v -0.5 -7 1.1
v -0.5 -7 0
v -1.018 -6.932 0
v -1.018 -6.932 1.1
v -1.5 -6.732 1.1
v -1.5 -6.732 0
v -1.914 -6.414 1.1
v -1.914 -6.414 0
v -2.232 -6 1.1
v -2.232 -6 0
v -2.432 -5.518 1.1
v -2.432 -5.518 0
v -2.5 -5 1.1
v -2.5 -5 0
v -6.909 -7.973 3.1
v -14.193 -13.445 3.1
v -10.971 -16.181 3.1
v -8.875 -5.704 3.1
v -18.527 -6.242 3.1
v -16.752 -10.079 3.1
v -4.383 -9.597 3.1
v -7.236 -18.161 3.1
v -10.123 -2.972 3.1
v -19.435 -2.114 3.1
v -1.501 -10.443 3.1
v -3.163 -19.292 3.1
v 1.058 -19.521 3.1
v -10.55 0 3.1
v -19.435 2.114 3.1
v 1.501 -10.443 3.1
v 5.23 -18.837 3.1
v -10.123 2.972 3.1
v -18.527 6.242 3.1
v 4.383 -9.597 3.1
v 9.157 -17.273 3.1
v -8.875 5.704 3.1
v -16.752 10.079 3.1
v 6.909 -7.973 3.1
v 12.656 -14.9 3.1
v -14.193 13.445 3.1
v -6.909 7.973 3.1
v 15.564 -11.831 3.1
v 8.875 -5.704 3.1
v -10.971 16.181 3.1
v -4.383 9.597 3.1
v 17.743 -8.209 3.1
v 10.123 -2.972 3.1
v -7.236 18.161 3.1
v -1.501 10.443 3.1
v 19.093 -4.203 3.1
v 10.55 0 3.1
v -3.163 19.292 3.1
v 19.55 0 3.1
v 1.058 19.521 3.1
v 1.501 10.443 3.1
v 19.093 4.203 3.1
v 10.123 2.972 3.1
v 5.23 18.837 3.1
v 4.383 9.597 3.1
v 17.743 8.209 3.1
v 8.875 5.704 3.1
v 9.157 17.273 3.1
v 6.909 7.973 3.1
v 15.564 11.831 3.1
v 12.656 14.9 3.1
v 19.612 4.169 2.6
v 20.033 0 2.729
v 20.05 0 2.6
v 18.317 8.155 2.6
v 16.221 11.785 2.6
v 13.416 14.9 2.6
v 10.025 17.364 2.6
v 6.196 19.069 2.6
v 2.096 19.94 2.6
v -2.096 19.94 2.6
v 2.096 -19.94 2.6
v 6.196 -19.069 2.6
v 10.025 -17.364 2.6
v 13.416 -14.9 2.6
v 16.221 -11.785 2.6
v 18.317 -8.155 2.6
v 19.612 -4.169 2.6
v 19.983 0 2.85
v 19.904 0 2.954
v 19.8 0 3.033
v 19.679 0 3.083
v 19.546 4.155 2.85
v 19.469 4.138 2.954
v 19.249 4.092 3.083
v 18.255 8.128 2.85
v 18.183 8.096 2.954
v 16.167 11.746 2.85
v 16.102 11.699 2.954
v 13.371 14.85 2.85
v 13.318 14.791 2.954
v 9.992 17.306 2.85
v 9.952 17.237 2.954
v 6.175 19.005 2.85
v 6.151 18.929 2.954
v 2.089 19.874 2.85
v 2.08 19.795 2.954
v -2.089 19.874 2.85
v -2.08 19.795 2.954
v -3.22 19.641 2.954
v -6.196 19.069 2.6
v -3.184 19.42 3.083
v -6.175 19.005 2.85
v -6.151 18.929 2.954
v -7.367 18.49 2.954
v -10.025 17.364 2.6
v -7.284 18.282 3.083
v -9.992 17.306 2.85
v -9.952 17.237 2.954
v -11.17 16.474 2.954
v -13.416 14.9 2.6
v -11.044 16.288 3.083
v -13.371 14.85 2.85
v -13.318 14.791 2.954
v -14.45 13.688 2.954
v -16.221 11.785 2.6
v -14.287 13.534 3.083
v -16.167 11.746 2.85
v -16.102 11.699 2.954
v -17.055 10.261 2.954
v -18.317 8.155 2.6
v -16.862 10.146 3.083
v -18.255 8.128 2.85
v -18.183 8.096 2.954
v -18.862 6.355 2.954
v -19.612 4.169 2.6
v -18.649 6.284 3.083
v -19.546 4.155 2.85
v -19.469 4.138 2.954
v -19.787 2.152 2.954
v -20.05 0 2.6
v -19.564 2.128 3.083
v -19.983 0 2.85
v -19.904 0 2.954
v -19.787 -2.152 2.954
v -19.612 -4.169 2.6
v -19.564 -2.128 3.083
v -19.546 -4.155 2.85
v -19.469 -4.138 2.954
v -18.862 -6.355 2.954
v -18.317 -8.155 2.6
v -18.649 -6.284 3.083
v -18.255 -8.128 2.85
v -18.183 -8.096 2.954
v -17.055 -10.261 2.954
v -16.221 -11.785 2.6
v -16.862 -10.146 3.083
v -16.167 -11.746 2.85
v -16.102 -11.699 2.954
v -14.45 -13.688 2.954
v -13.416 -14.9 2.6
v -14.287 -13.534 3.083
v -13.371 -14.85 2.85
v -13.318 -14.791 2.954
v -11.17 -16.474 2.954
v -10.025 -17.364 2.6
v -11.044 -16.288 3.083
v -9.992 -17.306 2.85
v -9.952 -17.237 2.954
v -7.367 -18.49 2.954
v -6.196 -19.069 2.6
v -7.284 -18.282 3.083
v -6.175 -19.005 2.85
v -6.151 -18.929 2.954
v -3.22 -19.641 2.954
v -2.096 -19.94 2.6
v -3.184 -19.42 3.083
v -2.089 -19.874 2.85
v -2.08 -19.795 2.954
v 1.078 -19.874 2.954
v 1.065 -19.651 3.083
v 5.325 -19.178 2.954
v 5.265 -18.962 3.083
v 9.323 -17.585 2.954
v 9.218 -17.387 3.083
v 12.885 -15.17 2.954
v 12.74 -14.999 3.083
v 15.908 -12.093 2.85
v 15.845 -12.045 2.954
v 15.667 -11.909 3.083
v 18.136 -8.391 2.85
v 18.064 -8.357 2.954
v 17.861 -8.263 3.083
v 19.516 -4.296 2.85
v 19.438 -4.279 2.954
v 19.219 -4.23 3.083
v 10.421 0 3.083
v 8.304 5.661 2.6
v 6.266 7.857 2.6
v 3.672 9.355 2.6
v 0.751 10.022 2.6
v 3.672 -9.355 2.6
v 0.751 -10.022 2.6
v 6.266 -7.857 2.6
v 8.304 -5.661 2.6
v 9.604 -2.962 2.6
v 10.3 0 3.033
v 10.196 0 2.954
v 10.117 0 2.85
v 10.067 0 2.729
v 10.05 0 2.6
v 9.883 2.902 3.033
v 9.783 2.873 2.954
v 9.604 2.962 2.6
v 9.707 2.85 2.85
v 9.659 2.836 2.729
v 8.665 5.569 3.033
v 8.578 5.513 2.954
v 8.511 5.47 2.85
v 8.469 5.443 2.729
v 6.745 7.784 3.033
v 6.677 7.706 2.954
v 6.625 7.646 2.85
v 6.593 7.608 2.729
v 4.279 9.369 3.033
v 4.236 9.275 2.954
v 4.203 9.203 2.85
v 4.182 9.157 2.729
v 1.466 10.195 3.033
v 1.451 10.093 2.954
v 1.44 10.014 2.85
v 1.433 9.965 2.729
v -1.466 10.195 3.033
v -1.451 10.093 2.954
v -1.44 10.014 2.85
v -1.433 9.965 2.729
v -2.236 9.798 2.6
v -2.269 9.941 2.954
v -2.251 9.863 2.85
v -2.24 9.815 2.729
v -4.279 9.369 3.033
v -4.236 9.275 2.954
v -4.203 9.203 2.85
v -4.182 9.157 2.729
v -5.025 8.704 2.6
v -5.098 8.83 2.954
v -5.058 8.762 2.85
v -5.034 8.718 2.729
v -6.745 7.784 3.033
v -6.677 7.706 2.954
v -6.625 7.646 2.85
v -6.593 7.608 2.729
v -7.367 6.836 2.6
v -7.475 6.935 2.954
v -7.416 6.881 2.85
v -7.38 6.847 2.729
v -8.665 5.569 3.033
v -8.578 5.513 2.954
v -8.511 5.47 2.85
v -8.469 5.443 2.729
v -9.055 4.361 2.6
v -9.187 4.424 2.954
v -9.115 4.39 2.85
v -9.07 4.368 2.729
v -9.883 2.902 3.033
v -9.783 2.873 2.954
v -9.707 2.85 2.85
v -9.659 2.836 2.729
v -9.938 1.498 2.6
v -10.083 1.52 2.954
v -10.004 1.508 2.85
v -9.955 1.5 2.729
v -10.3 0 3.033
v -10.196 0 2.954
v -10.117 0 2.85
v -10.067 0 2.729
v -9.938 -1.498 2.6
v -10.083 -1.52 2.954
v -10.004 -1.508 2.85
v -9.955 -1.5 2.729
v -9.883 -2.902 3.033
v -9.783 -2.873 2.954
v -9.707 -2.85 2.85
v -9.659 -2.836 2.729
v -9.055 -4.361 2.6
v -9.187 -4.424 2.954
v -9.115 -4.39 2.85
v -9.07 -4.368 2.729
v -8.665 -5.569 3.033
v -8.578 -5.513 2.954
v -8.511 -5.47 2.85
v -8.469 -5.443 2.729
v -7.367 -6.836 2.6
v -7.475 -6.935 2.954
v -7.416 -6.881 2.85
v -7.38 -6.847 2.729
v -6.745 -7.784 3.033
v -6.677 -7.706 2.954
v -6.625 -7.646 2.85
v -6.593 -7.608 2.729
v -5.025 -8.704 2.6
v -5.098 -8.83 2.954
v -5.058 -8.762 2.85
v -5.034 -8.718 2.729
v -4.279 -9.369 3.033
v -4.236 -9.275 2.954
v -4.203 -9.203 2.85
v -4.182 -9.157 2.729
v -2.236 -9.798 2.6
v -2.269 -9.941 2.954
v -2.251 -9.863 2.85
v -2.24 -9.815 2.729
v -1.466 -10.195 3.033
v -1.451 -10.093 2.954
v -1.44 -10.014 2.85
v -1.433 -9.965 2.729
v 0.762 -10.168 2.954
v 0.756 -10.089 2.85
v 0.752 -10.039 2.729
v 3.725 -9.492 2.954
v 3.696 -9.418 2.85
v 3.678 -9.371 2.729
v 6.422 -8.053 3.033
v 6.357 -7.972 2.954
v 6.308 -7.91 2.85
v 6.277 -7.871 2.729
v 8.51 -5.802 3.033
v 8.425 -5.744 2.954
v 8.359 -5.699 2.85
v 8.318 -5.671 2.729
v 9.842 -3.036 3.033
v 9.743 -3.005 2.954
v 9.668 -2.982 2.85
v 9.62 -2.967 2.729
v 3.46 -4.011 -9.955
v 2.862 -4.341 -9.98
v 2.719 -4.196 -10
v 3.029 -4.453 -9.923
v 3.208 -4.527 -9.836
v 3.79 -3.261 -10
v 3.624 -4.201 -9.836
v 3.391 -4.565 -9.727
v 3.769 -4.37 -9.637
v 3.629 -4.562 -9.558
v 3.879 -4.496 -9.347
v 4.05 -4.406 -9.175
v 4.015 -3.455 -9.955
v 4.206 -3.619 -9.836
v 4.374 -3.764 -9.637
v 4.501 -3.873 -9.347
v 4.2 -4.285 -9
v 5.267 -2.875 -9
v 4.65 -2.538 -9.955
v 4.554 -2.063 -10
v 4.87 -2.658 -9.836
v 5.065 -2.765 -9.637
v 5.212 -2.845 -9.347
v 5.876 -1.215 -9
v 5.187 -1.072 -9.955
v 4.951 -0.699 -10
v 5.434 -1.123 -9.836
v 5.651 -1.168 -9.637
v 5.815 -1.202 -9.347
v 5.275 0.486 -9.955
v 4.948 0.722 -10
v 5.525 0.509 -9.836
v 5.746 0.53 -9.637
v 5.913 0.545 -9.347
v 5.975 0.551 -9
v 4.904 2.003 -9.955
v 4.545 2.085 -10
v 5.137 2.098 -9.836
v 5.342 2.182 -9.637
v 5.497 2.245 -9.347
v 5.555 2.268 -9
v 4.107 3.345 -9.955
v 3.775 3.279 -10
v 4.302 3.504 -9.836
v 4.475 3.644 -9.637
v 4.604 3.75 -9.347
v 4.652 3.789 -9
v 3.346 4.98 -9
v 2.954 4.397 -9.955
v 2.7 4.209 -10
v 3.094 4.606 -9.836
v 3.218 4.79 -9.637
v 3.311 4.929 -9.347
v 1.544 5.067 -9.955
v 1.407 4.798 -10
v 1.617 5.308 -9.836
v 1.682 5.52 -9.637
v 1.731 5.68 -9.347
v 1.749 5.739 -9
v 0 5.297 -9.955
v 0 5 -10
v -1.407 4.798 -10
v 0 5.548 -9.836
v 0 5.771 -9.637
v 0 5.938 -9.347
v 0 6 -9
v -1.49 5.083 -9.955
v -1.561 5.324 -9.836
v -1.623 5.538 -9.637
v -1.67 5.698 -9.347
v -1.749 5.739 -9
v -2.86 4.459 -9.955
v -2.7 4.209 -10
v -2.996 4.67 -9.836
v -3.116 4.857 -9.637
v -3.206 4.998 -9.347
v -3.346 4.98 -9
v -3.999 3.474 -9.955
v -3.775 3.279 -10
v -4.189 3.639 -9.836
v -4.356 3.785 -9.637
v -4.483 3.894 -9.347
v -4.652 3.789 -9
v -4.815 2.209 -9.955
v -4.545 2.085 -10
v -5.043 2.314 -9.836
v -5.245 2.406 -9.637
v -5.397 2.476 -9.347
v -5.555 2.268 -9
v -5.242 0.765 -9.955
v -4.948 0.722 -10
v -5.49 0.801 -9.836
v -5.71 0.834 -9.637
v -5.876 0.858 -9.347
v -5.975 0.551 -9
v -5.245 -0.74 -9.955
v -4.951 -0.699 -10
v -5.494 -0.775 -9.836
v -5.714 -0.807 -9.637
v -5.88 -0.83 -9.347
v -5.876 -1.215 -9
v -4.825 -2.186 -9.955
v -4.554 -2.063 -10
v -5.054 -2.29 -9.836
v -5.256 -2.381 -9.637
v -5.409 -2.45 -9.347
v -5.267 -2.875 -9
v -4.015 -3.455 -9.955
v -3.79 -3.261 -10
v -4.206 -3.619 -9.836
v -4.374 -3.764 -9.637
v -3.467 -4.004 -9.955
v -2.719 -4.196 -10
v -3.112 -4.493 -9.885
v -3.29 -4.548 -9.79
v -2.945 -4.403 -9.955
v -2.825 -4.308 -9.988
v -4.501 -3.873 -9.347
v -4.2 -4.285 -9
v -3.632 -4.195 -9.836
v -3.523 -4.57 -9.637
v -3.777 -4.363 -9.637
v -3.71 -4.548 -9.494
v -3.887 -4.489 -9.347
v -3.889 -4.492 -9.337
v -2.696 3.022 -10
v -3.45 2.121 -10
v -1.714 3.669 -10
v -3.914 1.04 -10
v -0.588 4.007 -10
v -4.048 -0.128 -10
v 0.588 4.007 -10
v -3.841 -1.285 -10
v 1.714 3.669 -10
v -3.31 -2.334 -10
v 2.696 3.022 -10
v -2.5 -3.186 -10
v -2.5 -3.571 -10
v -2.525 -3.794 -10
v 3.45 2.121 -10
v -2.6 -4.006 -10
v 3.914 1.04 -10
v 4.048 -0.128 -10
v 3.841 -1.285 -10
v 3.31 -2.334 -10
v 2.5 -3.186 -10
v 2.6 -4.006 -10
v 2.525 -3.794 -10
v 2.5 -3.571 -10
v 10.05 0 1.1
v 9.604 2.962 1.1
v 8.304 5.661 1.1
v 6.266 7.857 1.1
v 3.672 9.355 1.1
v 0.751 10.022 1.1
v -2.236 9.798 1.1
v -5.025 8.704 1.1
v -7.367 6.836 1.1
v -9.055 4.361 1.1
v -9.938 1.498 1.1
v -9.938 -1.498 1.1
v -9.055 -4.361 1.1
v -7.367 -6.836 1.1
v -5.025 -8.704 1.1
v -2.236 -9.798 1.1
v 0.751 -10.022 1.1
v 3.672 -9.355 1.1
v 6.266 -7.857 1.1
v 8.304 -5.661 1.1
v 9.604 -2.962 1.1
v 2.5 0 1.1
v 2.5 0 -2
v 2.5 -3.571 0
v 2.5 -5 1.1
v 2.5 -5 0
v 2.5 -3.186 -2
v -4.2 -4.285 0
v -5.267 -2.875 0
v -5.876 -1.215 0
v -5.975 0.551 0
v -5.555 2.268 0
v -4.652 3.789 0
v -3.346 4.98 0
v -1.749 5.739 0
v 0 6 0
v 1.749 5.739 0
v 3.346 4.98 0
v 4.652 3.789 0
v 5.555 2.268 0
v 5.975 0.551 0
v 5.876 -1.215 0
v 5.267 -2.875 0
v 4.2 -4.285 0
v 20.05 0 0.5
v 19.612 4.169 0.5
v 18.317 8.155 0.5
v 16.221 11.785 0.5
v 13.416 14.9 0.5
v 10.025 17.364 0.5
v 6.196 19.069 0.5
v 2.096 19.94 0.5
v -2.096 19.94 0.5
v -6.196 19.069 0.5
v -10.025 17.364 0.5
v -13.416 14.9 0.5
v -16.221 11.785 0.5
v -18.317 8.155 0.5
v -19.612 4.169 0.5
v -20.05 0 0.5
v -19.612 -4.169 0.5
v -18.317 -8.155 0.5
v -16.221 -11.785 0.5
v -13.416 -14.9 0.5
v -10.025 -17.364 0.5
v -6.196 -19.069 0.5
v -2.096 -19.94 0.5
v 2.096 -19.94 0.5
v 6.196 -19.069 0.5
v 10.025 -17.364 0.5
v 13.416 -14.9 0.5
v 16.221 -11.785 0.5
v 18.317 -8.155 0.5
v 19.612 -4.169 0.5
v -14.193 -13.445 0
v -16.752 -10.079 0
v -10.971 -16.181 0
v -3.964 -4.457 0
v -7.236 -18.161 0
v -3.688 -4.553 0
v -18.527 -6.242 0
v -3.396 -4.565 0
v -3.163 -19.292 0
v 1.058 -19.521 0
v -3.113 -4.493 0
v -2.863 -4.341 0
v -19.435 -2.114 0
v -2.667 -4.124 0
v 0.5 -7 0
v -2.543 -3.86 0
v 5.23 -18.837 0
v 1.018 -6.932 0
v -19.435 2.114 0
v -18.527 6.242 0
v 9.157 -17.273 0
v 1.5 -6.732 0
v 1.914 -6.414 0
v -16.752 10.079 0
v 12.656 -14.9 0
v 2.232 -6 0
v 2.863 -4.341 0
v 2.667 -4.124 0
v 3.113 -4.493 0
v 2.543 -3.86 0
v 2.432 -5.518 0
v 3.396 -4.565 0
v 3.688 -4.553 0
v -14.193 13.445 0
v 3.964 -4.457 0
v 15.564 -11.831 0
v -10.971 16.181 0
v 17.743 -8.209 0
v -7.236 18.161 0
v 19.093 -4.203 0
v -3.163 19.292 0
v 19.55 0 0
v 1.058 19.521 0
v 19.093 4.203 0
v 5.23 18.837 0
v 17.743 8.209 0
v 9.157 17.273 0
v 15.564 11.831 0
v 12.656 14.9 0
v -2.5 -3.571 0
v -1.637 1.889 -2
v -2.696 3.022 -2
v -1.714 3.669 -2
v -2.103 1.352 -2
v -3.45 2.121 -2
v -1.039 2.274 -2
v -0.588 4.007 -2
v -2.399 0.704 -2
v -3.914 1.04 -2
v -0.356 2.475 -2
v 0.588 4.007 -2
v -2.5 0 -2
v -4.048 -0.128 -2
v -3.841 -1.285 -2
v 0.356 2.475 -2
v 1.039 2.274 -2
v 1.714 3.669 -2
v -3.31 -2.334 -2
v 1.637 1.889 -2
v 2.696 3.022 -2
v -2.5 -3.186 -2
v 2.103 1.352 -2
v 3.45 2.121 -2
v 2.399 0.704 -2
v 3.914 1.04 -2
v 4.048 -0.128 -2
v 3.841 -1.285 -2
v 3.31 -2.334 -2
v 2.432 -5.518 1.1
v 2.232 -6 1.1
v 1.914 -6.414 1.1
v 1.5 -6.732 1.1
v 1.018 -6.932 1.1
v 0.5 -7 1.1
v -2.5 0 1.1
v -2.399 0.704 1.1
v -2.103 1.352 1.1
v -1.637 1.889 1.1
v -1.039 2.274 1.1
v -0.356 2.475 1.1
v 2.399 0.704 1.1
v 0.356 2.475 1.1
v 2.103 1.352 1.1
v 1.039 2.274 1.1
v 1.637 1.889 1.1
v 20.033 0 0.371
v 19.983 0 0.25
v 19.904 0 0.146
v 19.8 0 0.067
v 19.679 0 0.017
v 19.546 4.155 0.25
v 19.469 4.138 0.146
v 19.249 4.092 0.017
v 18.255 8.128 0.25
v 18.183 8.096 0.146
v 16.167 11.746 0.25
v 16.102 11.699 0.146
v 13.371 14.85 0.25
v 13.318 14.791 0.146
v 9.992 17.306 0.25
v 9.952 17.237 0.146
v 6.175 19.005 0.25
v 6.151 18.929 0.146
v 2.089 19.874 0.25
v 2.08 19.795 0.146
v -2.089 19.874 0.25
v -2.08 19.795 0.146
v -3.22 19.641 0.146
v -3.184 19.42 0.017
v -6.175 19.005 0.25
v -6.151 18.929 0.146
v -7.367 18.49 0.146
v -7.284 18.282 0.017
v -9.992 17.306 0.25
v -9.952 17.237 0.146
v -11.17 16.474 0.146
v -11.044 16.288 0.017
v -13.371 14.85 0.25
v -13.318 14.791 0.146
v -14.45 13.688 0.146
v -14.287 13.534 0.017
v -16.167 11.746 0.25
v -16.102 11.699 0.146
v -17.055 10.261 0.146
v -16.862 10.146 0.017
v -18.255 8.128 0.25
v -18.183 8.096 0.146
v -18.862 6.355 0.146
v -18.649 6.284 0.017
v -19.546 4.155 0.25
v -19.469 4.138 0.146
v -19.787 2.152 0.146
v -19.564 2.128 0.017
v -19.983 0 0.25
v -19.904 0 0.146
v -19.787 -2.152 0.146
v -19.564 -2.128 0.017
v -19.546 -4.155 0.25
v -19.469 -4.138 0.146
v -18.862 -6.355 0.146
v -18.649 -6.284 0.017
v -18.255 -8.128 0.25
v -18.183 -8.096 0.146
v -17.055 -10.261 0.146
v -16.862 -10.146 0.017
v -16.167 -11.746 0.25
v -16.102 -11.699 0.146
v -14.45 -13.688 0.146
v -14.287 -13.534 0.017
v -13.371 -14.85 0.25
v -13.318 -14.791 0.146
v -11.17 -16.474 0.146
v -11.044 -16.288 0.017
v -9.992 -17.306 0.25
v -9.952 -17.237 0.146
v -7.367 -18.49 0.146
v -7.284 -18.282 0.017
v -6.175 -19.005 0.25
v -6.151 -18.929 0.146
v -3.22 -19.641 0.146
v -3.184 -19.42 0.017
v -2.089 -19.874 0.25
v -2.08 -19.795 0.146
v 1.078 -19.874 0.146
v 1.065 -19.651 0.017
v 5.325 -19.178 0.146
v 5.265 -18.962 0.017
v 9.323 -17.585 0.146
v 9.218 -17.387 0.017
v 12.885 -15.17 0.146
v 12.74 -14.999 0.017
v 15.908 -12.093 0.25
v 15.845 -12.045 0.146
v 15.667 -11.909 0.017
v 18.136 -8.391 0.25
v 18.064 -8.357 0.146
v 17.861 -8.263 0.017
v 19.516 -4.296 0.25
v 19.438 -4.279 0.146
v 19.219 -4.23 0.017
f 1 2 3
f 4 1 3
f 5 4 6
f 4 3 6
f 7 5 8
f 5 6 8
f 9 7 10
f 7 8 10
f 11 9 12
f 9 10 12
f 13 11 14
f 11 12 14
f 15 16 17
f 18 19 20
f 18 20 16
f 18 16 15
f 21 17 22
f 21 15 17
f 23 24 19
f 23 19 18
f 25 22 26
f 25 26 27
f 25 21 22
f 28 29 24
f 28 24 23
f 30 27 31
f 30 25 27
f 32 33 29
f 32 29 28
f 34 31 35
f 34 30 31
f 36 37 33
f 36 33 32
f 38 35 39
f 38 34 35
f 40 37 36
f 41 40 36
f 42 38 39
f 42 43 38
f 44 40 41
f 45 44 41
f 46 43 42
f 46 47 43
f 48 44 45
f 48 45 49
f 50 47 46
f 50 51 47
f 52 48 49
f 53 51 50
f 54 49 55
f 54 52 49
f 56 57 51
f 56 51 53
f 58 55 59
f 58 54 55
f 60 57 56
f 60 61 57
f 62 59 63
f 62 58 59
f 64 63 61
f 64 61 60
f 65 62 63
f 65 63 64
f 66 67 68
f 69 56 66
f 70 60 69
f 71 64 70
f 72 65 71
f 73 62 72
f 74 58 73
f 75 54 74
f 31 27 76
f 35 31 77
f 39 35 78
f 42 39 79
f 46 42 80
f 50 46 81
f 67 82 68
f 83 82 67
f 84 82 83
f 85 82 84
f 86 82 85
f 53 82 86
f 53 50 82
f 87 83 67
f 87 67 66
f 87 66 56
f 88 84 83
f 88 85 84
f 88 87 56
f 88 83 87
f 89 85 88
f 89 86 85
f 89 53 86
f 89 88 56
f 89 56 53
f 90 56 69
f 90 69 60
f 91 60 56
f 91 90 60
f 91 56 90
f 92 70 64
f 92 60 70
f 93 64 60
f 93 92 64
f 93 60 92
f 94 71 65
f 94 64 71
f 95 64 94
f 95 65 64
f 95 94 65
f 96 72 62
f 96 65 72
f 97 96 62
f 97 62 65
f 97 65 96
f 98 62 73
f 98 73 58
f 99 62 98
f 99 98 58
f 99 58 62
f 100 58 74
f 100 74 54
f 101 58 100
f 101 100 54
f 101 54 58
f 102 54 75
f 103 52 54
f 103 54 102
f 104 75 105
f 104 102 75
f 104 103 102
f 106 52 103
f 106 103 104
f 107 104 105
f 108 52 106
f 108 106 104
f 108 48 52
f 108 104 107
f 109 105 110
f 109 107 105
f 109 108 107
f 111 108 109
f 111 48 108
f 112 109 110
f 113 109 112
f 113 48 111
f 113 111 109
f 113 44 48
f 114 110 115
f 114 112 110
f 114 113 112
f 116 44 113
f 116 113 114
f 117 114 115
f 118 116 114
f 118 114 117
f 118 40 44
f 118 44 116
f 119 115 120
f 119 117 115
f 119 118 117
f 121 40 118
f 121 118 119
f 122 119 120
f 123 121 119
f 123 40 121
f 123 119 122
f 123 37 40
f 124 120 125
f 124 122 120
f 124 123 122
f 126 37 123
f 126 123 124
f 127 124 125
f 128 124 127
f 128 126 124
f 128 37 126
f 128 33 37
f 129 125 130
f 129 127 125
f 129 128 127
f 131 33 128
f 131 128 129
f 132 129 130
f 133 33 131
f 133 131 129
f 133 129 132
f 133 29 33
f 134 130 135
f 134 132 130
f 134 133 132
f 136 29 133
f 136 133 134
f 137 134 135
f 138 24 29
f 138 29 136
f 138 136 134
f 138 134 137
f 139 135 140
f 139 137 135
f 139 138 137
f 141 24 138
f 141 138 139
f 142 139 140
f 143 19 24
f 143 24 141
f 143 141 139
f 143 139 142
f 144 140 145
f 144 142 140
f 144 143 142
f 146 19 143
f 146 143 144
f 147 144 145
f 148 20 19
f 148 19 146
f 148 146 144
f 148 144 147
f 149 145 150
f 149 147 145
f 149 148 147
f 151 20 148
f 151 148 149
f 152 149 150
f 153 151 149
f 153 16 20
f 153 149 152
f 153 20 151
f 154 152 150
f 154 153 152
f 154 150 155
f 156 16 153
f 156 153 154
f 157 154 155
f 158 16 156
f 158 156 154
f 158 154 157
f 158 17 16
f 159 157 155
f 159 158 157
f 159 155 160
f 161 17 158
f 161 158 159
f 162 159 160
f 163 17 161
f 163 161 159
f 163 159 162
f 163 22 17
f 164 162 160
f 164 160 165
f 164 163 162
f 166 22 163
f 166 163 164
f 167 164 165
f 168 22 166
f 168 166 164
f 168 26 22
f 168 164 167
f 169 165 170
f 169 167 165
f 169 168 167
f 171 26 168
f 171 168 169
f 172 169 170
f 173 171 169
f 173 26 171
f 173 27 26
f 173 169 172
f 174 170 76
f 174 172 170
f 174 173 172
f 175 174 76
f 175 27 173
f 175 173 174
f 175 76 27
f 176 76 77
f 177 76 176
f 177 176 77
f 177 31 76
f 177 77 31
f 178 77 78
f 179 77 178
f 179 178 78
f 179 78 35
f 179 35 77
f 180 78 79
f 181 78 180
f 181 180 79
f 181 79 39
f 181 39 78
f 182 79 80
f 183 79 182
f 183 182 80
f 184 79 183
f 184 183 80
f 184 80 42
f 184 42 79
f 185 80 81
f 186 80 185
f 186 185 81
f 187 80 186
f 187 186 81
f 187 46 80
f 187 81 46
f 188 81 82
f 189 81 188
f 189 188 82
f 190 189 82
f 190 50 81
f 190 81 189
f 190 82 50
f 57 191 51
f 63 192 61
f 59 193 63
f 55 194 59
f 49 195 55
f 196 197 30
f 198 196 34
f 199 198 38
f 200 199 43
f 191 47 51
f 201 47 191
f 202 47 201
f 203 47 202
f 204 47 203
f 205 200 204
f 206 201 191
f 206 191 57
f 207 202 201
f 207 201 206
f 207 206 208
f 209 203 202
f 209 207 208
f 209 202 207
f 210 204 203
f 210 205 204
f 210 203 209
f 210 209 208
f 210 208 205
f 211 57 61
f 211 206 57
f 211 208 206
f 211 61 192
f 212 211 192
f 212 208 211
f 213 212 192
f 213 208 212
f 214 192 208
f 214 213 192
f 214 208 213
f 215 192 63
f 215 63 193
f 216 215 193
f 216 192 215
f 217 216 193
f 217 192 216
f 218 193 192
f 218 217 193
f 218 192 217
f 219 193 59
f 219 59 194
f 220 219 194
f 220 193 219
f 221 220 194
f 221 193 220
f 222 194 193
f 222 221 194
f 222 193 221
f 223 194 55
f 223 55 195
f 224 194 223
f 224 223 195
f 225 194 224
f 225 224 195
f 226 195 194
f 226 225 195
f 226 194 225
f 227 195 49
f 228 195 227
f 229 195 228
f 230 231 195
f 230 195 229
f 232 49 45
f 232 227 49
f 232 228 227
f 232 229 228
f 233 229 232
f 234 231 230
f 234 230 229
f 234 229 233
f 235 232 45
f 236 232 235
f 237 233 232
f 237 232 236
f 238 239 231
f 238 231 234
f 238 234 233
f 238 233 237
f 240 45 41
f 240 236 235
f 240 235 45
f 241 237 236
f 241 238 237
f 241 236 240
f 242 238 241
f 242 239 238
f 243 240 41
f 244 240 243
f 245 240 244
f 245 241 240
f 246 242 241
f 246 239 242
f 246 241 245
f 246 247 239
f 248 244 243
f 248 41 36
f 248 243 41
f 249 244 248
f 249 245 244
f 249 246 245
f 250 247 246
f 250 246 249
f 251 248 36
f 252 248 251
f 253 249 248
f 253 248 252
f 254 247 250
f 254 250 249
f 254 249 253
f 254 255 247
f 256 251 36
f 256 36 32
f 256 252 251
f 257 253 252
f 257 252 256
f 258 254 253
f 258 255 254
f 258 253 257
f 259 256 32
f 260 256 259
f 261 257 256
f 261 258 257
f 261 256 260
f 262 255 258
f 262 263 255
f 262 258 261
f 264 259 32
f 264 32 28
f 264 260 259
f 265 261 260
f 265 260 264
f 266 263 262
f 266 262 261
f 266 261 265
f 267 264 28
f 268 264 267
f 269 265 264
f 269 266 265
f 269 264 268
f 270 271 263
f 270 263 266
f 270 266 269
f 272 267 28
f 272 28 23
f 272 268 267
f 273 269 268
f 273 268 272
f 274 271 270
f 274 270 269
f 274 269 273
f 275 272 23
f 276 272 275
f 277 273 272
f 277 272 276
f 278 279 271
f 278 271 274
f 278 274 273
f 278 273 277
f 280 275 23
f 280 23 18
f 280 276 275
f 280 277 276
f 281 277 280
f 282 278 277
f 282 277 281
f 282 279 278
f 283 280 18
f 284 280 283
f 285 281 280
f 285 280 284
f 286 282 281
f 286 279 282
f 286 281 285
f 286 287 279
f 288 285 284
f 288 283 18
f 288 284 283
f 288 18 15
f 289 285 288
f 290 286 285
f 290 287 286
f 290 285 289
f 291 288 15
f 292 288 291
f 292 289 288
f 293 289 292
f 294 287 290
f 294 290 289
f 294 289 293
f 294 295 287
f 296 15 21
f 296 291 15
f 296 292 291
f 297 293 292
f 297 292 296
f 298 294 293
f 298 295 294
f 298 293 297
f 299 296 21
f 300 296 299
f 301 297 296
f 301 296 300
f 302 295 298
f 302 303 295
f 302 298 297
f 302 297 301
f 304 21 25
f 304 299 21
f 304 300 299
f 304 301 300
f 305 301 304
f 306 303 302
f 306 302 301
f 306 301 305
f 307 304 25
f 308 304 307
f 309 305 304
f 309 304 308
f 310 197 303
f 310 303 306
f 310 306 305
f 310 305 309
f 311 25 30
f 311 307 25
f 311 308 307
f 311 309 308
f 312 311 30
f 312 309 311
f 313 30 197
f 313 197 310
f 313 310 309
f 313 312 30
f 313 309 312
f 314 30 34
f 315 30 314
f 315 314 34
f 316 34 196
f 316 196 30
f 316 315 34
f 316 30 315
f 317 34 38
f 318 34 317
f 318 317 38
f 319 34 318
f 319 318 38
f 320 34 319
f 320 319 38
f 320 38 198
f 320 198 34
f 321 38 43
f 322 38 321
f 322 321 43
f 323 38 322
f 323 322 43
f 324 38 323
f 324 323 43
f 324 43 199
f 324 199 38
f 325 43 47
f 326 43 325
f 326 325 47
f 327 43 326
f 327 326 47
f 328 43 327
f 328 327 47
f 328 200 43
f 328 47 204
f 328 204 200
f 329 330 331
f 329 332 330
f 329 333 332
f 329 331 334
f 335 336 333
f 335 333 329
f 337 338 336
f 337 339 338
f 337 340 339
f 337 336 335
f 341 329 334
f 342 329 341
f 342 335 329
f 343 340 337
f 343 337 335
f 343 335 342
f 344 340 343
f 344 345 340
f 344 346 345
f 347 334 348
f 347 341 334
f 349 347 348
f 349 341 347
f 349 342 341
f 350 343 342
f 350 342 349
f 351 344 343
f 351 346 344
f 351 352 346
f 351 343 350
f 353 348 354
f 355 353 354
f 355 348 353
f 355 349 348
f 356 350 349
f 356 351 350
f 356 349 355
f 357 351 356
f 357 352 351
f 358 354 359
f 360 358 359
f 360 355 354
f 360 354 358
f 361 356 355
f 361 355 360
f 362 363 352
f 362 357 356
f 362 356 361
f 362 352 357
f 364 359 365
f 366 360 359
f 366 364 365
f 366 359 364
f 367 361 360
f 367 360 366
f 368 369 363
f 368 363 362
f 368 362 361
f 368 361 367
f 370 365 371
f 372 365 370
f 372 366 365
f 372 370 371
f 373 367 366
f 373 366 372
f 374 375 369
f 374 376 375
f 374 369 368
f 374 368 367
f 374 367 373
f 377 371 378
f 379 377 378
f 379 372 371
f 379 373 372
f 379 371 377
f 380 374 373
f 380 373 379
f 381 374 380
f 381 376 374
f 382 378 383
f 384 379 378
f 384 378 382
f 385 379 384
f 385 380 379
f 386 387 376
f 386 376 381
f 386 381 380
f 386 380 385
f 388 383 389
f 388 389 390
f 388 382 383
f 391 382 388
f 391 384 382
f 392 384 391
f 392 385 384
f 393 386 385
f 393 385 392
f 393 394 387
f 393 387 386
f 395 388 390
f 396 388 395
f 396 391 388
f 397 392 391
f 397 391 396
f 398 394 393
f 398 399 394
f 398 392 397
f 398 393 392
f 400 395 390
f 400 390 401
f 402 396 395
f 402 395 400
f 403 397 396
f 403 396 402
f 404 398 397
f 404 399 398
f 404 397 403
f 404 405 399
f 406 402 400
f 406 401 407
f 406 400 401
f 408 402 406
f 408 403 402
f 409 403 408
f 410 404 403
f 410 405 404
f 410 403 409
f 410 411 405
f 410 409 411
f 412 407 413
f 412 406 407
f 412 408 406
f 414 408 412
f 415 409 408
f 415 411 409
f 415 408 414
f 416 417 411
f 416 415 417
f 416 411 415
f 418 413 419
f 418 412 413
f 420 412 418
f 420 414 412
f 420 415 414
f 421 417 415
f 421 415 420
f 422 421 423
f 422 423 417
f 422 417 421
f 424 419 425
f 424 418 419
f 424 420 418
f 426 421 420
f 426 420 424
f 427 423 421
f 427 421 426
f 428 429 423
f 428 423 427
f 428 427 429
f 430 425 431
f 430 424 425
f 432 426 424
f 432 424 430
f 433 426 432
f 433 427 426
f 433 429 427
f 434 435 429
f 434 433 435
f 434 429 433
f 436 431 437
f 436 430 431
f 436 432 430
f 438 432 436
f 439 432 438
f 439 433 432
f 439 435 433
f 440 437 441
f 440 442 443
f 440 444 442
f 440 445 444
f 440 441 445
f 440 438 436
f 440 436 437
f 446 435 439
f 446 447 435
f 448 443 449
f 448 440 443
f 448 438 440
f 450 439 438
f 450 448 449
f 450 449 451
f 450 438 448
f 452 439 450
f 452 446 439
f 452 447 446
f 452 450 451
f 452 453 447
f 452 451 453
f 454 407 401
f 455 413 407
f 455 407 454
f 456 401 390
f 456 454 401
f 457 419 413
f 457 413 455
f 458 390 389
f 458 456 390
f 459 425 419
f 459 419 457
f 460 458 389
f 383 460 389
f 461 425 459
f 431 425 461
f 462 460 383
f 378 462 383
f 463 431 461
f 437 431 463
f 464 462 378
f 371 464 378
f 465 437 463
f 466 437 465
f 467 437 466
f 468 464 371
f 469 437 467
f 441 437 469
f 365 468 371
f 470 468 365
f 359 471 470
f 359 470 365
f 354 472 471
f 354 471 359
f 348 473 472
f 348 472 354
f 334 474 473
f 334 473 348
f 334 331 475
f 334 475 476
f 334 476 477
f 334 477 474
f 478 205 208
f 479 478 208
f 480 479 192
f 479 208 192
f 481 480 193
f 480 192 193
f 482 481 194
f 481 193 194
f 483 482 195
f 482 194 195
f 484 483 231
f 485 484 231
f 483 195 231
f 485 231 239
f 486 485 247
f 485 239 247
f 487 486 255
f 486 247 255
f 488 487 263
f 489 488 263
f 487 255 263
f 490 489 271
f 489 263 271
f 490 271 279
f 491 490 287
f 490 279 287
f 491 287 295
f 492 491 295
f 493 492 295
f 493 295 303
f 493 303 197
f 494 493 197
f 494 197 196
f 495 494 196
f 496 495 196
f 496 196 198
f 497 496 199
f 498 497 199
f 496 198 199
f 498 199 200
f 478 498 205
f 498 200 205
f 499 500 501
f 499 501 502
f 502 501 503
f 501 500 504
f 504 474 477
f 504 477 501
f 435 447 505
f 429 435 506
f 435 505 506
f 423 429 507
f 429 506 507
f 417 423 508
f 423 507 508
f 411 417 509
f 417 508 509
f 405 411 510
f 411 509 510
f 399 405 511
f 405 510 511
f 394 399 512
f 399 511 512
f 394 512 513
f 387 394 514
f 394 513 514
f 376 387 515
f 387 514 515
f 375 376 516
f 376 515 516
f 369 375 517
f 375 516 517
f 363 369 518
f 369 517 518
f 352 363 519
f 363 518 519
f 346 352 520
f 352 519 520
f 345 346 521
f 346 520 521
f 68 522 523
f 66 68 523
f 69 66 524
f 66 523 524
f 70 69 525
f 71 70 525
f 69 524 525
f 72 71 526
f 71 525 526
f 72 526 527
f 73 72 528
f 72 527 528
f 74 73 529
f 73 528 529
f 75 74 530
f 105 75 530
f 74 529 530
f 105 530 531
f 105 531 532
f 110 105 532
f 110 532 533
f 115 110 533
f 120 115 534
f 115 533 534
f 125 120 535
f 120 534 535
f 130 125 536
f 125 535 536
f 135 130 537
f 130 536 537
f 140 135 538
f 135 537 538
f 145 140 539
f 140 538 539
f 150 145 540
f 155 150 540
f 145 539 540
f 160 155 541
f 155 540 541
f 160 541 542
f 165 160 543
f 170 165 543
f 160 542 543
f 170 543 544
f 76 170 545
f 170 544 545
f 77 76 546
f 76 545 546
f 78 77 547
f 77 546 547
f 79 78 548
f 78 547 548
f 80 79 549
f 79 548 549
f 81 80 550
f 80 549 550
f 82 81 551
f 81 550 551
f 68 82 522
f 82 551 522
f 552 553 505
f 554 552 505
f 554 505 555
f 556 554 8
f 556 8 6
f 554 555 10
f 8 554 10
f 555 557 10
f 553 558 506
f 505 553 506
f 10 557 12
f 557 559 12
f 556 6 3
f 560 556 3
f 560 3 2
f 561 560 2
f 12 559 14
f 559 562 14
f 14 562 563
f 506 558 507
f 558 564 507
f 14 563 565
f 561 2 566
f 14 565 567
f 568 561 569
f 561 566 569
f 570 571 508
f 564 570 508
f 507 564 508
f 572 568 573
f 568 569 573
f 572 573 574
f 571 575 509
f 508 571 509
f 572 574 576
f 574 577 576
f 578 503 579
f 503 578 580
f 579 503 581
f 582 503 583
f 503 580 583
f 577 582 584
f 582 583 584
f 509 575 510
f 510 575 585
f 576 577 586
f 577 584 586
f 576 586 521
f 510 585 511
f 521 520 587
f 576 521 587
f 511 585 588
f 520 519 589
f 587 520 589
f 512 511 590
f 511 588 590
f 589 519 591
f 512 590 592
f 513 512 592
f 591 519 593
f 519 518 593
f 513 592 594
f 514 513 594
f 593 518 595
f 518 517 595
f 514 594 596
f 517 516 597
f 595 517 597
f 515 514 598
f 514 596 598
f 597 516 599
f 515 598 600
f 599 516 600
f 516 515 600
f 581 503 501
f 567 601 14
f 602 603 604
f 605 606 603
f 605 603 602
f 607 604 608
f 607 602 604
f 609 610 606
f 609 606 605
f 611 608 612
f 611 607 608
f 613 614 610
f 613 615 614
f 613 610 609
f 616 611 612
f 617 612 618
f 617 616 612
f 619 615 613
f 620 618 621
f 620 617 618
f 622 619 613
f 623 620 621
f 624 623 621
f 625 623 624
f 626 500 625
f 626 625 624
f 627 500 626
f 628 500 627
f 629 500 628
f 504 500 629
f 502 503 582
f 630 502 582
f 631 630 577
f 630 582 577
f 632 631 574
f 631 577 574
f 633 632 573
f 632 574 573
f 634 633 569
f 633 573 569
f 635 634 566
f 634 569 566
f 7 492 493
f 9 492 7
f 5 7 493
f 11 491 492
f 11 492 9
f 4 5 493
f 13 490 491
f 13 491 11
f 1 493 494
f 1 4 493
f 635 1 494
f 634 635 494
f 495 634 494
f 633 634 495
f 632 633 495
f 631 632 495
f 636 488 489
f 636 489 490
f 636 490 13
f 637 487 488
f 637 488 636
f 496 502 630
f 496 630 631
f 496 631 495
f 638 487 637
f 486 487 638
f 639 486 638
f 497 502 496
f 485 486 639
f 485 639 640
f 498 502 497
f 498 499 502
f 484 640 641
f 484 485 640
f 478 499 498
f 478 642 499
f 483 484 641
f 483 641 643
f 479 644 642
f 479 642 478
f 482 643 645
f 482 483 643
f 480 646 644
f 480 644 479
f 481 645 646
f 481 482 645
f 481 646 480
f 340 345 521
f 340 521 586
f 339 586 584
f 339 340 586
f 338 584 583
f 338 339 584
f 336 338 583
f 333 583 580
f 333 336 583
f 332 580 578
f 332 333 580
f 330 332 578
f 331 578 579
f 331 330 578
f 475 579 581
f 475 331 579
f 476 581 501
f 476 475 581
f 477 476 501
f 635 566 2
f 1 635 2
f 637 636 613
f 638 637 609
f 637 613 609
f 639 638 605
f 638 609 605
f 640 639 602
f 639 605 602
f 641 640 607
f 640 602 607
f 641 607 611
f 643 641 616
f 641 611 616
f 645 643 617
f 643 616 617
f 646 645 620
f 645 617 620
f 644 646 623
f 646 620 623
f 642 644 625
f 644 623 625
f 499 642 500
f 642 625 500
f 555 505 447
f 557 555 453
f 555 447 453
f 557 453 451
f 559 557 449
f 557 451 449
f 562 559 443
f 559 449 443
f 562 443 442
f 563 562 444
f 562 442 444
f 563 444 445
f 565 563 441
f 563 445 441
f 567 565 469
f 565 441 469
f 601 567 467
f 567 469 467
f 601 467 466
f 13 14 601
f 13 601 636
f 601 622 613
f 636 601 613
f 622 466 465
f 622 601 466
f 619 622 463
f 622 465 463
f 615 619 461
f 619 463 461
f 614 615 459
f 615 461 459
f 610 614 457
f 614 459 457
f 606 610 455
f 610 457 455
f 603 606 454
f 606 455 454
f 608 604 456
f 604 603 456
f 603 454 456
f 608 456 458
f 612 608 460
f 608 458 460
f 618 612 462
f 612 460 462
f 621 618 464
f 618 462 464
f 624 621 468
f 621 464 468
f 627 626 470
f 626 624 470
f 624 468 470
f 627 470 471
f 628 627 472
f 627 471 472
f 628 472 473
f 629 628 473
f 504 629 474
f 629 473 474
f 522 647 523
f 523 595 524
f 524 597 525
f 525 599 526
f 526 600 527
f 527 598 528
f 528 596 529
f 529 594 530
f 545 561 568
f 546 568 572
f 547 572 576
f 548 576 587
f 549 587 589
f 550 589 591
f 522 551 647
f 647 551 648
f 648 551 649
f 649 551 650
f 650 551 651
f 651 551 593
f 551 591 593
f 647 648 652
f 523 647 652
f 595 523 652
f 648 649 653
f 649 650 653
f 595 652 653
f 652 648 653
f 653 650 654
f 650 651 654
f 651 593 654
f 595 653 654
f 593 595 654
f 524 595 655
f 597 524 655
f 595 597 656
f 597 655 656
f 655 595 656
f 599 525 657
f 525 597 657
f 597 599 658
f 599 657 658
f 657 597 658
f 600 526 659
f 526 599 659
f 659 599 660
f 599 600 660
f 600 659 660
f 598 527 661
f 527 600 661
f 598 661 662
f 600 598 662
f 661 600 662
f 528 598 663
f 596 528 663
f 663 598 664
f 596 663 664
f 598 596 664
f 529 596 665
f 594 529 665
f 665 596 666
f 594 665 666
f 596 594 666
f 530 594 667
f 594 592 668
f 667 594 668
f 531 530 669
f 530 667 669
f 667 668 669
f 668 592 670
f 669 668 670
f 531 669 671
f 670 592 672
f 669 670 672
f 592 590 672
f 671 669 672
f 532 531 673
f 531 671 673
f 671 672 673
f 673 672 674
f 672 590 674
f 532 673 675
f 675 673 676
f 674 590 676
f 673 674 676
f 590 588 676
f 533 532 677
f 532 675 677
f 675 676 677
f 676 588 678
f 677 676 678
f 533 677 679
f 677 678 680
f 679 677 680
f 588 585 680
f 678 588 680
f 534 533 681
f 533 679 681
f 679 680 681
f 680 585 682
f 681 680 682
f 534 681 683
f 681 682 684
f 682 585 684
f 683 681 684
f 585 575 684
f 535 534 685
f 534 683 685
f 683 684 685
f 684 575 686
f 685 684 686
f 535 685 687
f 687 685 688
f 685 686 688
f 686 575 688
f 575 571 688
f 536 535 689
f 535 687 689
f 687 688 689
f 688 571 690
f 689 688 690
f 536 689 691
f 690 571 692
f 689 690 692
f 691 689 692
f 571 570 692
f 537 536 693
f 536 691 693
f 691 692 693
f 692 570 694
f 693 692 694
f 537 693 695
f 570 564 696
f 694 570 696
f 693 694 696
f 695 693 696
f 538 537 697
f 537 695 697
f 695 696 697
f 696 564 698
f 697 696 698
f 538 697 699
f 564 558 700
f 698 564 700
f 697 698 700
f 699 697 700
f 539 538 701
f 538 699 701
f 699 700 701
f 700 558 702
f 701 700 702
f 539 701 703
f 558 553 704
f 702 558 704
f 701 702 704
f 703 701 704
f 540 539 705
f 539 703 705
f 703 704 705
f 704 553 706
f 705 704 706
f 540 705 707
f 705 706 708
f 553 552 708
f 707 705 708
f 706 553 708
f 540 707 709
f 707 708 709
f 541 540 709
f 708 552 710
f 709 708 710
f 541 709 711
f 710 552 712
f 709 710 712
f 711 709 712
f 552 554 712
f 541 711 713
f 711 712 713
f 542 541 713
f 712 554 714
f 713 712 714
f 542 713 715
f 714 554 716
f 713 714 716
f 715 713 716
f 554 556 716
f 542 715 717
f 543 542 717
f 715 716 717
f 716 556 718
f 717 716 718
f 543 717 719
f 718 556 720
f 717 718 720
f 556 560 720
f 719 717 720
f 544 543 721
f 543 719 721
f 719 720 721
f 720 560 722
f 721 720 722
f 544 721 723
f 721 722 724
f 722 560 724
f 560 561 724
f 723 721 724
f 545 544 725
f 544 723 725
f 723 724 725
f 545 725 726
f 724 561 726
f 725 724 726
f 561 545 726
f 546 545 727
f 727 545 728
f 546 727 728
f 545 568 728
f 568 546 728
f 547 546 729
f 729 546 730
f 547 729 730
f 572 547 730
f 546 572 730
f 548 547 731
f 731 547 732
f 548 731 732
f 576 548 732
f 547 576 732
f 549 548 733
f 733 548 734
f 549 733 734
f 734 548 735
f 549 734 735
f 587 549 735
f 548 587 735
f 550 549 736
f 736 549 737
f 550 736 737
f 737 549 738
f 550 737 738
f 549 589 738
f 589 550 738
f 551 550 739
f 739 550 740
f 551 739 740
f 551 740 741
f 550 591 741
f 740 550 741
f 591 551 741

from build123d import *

# Parameters (mm, degrees)
F0_R           = 20.05
F1_DEPTH       = 3.1
F2_R           = 10.05
F3_DEPTH       = 2
F4_R           = 0.5
F6_R           = 6
F7_DEPTH       = 10
F8_R           = 4.05
F9_DEPTH       = 8
F10_DEPTH      = 10.001
F10_DEPTH_BACK = 3.1010001
F11_T1_DEPTH   = 15.3170452501
F11_T4_ANGLE   = 359.9586190749


# Not quite as in the source:
# - a fillet or chamfer that OpenCascade refuses, or shapes differently, is made with other operations: its cross-section is extruded or revolved along the edge and cut away or added


with BuildPart() as f1:
    # F0 (on Top) → F1 (new body)
    with BuildSketch(Plane.XY):
        Circle(F0_R)
    extrude(amount=F1_DEPTH)

    # F2 (on face) → F3 (cut)
    with BuildSketch(Plane.XY.offset(3.1)):
        Circle(F2_R)
    extrude(amount=-F3_DEPTH, mode=Mode.SUBTRACT)

    # F4
    f4_edges = [f1.edges().sort_by_distance(p)[0] for p in [
        (-20.05, 0, 3.1),
        (-10.05, 0, 3.1),
        (-20.05, 0, 0),
    ]]
    fillet(f4_edges, radius=F4_R)

    # F6 (on face) → F7 (join)
    with BuildSketch(Plane(origin=(0, 0, 0), x_dir=(1, 0, 0), z_dir=(0, 0, -1))):
        Circle(F6_R)
    extrude(amount=F7_DEPTH)

    # F8 (on face) → F9 (cut)
    with BuildSketch(Plane(origin=(0, 0, -10), x_dir=(1, 0, 0), z_dir=(0, 0, -1))):
        Circle(F8_R)
    extrude(amount=-F9_DEPTH, mode=Mode.SUBTRACT)

    # F5 (on face) → F10 (cut, two sides)
    with BuildSketch(Plane(origin=(0, 0, 0), x_dir=(1, 0, 0), z_dir=(0, 0, -1))) as f10_sk:
        with BuildLine():
            Line((-2.5, 5), (-2.5, 0))
            ThreePointArc((-2.5, 0), (0, -2.5), (2.5, 0))
            Line((2.5, 0), (2.5, 5))
            ThreePointArc((2.5, 5), (1.9142135624, 6.4142135624), (0.5, 7))
            Line((0.5, 7), (-0.5, 7))
            ThreePointArc((-0.5, 7), (-1.9142135624, 6.4142135624), (-2.5, 5))
        make_face()
    extrude(amount=F10_DEPTH, mode=Mode.SUBTRACT)
    extrude(f10_sk.sketch, amount=-F10_DEPTH_BACK, mode=Mode.SUBTRACT)

    # F11: fillet of radius 1 on 3 edges, made by hand

    # F11_s2 → F11_t1 (cut)
    with BuildSketch(Plane.XY.offset(-15.3170452501)):
        with BuildLine():
            ThreePointArc((-4.2, -4.2848570571), (-3.1127016654, -4.49266866), (-2.5, -3.5707142143))
            Line((-2.5, -3.5707142143), (-2.4, -3.5707142143))
            ThreePointArc((-2.4, -3.5707142143), (-2.4, -5), (-2.3442646941, -5.4568235306))
            Line((-2.3442646941, -5.4568235306), (-2.4820201112, -5.5722146555))
            ThreePointArc((-2.4820201112, -5.5722146555), (-3.4303168121, -5.0440981918), (-4.27, -4.3562713414))
            Line((-4.27, -4.3562713414), (-4.2, -4.2848570571))
        make_face()
        with BuildLine():
            ThreePointArc((4.2, -4.2848570571), (3.1127016654, -4.49266866), (2.5, -3.5707142143))
            Line((2.5, -3.5707142143), (2.4, -3.5707142143))
            ThreePointArc((2.4, -3.5707142143), (2.4, -5), (2.3442646941, -5.4568235306))
            Line((2.3442646941, -5.4568235306), (2.4820201112, -5.5722146555))
            ThreePointArc((2.4820201112, -5.5722146555), (3.4303168121, -5.0440981918), (4.27, -4.3562713414))
            Line((4.27, -4.3562713414), (4.2, -4.2848570571))
        make_face()
    extrude(amount=F11_T1_DEPTH, mode=Mode.SUBTRACT)

    # F11_s3 → F11_t4 (revolve, cut)
    with BuildSketch(Plane(origin=(0, 0, 0), x_dir=(0, 0, 1), z_dir=(-0.9999999348, -0.0003611167, 0))):
        with BuildLine():
            ThreePointArc((-10, -5), (-9.7071067812, -5.7071067812), (-9, -6))
            Line((-9, -6), (-10, -6))
            Line((-10, -6), (-10, -5))
        make_face()
    revolve(axis=Axis((0, 0, -10), (0, 0, 1)), revolution_arc=F11_T4_ANGLE, mode=Mode.SUBTRACT)


solid = f1.part
